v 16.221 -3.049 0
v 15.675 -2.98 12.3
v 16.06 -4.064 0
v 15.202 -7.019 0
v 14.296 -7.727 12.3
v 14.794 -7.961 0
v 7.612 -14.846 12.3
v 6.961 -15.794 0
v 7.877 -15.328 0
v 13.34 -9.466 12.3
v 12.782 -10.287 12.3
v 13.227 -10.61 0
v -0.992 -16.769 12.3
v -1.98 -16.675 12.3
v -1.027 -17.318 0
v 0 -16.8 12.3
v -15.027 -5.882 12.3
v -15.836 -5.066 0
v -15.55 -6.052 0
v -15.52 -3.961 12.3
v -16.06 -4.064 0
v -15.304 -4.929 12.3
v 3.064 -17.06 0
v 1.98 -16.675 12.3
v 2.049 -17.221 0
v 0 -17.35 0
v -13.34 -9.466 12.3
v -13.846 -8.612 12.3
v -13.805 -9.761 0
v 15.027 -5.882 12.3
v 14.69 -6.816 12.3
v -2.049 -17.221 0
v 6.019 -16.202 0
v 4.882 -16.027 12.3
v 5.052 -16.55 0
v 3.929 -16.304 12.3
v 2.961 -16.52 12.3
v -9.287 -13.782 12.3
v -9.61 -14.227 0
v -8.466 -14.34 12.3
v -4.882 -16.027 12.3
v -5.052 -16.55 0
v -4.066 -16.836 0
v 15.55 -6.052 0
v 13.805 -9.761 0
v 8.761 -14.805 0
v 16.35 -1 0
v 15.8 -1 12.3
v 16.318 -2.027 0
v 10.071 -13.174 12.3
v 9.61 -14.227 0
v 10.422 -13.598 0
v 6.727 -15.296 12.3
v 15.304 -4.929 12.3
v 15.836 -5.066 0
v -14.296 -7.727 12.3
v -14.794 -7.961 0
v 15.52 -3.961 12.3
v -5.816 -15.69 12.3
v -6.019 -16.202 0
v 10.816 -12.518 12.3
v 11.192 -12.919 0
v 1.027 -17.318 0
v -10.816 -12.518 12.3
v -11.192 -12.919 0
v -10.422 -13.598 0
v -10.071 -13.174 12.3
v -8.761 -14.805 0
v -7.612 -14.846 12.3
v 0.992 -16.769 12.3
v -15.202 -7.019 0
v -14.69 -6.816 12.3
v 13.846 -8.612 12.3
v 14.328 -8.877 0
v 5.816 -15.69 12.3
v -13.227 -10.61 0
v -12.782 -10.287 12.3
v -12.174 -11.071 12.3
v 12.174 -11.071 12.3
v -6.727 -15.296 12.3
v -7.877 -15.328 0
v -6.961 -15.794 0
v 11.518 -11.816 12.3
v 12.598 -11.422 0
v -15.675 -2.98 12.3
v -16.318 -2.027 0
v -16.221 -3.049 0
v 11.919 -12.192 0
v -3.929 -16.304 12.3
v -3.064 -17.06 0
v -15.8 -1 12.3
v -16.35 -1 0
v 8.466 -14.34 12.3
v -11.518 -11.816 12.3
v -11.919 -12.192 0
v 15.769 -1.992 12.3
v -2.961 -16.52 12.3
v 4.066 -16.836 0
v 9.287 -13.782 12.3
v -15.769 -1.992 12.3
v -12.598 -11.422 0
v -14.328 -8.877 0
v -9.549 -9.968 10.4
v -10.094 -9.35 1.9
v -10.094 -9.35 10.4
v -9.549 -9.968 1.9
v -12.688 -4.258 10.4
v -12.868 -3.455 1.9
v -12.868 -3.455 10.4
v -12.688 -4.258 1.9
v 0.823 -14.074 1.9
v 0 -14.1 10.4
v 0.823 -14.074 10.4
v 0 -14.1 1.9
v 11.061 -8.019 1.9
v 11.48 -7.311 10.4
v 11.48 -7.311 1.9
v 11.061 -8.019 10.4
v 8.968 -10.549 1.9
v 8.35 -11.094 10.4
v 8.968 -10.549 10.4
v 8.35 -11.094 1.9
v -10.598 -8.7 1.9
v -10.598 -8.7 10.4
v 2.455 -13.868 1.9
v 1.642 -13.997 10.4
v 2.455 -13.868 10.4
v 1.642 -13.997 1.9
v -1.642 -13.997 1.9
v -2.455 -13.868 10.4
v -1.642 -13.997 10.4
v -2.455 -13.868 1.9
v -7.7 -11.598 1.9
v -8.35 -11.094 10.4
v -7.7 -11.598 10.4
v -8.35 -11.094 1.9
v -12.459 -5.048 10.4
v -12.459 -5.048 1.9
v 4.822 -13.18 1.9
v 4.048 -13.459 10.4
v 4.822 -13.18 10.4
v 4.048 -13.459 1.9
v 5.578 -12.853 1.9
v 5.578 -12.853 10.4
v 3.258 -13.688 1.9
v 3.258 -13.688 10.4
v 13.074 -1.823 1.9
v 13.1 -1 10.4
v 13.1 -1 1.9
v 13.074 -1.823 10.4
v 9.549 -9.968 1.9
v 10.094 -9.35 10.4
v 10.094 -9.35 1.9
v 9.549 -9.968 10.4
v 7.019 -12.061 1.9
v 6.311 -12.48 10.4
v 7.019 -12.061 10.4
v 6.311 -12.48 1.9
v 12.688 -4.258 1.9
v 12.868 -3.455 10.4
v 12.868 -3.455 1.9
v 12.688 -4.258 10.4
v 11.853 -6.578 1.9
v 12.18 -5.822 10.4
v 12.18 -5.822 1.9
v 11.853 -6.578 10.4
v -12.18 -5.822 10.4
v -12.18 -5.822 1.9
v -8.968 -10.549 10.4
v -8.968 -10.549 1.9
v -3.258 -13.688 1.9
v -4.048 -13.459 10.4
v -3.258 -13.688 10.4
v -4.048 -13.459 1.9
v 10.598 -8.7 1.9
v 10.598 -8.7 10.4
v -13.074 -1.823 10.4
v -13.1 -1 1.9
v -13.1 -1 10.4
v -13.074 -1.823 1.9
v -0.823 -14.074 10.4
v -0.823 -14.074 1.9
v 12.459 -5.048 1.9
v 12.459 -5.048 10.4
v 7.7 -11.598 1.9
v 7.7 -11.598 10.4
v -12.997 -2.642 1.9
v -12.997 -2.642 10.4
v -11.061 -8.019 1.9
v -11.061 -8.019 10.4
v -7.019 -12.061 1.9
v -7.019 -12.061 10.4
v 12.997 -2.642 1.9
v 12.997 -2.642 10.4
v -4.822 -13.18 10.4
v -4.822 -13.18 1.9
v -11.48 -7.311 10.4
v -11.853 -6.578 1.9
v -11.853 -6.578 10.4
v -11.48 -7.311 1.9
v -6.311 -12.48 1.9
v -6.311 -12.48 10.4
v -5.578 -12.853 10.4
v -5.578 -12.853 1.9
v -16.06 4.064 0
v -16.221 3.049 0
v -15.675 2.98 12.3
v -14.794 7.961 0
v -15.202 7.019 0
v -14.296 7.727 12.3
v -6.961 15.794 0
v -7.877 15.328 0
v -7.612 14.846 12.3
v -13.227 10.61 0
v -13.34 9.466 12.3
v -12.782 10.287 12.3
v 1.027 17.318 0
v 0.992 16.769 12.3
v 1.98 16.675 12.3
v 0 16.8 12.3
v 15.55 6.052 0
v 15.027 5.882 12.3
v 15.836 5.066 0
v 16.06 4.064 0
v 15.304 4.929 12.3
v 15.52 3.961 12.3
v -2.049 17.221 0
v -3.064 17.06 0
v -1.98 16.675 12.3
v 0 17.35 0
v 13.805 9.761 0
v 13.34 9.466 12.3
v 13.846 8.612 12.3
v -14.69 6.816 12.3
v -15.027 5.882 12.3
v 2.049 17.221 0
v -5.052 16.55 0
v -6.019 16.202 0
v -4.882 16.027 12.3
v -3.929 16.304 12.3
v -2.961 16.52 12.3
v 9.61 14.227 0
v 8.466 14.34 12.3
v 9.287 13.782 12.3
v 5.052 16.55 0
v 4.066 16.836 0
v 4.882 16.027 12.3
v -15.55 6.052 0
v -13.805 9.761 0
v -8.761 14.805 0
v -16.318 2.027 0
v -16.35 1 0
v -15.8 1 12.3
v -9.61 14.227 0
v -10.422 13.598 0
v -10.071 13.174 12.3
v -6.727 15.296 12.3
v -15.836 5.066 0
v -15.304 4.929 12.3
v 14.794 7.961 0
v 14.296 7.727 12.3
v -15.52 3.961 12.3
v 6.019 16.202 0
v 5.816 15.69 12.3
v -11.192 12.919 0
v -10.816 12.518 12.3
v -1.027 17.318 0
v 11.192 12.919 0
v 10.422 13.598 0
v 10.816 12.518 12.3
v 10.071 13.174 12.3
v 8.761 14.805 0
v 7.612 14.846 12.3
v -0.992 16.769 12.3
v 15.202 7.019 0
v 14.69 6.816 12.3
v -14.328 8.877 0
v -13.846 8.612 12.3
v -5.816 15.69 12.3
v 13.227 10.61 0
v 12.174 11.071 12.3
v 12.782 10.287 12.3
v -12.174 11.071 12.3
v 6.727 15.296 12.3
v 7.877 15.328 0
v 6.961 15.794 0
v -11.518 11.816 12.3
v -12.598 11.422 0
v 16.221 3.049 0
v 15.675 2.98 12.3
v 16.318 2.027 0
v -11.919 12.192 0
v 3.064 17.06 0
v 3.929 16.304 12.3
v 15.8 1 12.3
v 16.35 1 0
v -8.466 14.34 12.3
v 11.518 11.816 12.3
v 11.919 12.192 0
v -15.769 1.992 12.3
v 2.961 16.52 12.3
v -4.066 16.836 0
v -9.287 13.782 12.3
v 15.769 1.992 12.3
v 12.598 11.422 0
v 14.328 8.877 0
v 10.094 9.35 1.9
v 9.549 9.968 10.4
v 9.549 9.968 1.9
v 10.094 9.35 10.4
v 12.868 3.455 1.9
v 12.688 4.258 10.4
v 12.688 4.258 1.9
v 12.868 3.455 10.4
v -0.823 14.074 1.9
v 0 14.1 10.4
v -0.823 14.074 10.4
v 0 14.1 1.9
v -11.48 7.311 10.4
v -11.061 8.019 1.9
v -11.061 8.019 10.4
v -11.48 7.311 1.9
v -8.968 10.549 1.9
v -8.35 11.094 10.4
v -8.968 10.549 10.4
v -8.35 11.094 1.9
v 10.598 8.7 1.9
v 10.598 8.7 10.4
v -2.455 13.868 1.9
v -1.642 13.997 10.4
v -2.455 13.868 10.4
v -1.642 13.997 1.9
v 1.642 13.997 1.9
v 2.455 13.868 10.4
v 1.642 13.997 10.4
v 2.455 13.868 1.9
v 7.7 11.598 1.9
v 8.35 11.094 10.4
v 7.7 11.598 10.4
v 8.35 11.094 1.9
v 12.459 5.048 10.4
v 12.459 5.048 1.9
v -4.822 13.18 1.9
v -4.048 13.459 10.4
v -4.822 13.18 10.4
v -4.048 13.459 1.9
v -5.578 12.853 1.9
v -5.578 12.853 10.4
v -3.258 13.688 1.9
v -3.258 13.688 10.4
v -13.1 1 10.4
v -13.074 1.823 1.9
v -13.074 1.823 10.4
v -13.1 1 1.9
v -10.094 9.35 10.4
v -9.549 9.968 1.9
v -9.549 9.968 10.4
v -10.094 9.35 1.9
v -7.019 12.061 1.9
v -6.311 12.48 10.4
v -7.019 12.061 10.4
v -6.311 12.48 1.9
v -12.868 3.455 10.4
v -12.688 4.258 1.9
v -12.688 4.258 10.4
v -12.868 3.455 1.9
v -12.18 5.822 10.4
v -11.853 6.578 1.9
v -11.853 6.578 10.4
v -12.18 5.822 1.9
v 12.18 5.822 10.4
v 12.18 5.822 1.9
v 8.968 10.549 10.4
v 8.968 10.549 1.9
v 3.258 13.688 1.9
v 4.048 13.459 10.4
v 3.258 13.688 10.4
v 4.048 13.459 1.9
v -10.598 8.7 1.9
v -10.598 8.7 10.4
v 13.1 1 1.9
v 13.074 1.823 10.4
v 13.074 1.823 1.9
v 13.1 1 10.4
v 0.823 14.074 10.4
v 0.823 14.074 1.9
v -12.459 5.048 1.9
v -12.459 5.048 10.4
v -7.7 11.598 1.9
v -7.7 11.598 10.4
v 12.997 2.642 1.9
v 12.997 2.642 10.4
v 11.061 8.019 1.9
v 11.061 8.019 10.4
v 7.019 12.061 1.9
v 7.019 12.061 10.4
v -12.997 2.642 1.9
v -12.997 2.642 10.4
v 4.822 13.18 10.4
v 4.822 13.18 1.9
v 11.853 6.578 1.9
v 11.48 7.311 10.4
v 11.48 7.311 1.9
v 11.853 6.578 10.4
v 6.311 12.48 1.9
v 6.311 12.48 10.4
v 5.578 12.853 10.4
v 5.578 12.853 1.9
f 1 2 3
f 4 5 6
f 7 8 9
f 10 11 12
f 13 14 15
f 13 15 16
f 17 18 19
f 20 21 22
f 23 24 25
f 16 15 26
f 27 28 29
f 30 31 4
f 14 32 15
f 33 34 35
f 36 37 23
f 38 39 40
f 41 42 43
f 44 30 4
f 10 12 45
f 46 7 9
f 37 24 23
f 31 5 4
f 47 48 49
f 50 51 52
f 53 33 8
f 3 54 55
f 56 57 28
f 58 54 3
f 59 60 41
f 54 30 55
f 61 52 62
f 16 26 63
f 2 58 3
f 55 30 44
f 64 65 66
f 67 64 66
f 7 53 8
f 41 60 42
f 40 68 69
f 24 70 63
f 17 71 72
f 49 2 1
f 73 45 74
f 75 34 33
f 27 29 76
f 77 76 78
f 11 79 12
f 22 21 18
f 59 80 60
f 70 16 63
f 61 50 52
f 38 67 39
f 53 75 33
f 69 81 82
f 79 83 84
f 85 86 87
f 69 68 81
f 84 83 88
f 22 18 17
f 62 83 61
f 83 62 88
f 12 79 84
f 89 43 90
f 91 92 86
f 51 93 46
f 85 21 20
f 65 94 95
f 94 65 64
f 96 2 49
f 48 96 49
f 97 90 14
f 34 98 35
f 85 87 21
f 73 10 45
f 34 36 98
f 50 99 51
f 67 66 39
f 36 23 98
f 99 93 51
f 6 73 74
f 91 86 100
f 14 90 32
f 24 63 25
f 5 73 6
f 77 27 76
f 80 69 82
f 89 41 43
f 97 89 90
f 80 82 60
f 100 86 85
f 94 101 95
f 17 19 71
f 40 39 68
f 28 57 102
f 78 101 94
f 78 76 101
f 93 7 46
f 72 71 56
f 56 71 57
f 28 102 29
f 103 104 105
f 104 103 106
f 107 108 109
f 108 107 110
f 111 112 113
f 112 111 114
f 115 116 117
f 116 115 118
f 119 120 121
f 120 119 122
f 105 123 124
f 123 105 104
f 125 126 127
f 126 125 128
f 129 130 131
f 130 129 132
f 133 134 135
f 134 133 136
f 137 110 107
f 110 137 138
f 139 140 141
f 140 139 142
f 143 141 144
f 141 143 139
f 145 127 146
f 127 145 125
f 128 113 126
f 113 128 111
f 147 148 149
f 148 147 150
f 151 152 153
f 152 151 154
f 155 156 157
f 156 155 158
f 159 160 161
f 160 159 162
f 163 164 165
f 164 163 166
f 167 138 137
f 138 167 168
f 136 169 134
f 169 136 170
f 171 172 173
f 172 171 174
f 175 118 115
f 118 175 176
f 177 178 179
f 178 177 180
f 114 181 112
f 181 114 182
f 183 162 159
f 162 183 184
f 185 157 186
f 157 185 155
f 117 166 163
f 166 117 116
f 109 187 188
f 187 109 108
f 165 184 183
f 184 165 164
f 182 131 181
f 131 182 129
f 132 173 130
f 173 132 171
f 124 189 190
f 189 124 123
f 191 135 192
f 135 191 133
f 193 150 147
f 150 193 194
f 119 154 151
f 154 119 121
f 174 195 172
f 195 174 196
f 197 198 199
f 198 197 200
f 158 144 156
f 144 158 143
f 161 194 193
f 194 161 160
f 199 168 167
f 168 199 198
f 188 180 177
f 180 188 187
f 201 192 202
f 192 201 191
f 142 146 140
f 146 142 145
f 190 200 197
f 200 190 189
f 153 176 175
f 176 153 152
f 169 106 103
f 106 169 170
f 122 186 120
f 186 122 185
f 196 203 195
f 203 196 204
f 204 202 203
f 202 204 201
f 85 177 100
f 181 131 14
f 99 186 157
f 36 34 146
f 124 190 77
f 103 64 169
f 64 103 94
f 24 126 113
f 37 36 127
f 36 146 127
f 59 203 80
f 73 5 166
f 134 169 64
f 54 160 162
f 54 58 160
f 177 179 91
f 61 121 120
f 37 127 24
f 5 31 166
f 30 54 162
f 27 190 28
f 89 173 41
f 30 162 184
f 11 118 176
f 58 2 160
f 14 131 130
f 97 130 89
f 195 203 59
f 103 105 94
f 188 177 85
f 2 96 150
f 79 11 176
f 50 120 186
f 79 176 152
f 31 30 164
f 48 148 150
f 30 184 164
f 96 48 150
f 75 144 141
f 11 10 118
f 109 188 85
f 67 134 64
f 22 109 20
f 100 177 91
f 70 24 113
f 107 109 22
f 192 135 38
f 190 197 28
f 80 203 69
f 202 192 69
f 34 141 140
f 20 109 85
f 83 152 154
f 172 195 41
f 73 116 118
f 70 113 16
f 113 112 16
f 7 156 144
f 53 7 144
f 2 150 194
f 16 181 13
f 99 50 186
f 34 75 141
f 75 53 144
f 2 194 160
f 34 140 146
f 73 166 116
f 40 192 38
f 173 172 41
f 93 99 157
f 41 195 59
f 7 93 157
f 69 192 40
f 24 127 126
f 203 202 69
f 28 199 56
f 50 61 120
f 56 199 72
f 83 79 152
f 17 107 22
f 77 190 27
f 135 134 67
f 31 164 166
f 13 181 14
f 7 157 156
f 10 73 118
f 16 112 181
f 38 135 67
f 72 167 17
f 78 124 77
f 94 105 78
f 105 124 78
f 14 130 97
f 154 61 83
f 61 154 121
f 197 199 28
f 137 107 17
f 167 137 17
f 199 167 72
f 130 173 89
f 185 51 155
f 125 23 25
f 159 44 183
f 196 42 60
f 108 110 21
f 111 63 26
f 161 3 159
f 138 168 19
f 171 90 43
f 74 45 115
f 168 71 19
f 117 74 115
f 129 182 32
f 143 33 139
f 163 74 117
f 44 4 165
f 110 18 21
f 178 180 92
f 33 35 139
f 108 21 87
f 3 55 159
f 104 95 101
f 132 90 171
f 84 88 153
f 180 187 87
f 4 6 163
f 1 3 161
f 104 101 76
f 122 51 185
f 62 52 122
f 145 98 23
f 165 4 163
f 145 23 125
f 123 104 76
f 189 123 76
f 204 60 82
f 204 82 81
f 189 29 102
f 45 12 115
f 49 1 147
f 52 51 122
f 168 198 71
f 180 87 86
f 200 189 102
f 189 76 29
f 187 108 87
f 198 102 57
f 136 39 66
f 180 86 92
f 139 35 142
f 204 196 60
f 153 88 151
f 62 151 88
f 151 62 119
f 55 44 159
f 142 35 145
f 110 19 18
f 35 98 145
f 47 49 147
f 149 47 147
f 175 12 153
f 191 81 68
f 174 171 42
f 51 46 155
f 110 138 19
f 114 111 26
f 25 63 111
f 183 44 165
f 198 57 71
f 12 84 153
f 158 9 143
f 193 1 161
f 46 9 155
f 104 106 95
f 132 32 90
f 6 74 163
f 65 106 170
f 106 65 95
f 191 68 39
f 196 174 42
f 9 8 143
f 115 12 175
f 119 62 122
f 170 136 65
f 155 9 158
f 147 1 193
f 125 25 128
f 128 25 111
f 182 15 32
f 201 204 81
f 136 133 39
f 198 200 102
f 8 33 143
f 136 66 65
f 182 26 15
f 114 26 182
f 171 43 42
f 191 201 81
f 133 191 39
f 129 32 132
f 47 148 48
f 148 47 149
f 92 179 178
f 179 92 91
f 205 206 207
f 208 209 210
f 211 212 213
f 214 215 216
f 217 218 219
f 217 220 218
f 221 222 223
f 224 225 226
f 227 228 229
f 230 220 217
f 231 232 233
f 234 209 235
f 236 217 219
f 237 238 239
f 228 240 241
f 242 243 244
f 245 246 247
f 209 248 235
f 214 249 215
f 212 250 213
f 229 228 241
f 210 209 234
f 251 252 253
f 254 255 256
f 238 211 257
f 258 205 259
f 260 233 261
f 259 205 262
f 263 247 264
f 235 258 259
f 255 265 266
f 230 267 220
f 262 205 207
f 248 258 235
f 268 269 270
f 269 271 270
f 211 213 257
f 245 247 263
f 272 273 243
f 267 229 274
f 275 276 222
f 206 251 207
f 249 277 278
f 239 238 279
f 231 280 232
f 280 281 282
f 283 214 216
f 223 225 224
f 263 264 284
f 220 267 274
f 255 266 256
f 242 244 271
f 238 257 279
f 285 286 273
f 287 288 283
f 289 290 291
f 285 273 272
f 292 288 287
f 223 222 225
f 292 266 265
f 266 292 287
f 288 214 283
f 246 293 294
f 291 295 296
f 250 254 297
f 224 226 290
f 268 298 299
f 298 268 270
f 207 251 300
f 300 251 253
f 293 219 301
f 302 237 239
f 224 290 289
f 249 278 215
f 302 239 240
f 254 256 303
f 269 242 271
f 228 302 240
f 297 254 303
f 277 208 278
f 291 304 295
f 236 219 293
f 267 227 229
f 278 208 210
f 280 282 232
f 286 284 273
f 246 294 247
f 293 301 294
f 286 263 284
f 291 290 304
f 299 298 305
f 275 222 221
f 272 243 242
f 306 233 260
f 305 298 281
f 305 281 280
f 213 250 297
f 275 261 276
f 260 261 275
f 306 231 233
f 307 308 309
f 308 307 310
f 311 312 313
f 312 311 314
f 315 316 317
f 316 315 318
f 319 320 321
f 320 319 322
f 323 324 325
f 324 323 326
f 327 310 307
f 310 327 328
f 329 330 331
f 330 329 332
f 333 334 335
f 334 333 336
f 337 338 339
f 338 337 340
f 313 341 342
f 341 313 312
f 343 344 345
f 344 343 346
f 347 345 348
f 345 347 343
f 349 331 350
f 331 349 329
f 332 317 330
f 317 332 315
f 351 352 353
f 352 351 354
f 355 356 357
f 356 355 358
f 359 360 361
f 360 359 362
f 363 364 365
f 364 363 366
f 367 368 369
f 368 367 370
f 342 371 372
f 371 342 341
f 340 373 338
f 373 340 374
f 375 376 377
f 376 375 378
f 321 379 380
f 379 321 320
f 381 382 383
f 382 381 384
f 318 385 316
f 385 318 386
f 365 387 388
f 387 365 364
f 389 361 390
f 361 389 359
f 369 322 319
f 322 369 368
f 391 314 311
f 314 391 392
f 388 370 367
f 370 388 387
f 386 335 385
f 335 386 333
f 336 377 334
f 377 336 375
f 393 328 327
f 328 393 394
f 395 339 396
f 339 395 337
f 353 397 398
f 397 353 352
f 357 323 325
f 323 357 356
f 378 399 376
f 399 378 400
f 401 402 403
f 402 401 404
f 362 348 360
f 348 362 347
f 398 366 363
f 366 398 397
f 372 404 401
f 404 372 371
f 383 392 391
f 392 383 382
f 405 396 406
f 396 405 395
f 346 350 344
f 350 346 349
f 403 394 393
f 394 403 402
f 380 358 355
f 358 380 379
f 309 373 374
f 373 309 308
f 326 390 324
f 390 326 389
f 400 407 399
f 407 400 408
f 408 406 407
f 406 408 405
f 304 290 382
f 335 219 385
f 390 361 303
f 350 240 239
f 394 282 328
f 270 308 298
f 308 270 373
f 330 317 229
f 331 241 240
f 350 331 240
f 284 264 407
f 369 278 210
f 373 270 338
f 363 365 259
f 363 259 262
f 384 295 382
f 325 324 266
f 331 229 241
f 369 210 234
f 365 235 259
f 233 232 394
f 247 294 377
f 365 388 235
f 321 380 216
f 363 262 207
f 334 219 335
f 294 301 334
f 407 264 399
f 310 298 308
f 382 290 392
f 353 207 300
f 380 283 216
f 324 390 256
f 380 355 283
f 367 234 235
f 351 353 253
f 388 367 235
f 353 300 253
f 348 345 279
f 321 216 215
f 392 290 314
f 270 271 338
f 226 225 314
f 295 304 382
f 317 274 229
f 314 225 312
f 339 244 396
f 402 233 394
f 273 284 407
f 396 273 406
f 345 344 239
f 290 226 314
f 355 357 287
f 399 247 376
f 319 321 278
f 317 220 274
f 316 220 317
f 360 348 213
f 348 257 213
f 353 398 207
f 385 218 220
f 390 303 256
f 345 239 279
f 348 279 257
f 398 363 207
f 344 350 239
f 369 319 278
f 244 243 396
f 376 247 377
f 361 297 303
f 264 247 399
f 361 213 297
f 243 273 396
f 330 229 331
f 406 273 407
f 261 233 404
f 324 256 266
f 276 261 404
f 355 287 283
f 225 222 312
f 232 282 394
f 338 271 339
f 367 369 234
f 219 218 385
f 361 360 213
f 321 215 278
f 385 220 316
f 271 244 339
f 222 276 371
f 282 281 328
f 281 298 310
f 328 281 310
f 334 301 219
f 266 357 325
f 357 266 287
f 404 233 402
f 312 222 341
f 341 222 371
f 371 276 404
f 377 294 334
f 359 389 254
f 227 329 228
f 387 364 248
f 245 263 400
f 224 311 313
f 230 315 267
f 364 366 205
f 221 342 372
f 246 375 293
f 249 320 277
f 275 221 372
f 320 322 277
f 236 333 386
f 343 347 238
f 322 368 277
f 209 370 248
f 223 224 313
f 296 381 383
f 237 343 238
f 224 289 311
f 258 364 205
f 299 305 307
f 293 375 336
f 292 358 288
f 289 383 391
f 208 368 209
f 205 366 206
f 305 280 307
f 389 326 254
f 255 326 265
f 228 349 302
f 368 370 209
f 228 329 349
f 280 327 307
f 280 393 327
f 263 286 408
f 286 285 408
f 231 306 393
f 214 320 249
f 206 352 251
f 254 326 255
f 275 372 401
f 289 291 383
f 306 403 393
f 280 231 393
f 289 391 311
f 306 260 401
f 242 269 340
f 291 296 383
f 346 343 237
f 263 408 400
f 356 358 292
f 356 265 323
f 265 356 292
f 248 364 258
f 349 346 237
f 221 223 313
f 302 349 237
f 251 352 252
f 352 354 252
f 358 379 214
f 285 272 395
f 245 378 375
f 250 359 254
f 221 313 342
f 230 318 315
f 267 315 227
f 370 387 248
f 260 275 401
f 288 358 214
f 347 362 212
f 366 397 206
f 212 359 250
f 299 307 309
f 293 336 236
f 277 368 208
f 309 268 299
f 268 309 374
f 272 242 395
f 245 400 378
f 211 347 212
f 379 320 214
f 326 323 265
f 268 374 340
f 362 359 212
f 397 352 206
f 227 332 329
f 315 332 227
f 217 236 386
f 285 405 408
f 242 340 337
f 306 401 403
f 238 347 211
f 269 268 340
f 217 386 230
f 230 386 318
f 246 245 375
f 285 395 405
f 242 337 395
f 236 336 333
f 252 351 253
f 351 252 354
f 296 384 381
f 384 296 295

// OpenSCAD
d_in_max = 26.2;
d_in_min = 26.2;
h_in = 8.5;

d_out_max = 32.7;
d_out_min = 31.6;
h_out = 12.3;

$fn=100;

module spool(){
difference(){
cylinder(r1=d_out_max/2, r2=d_out_min/2, h=h_out);
translate([0,0,(h_out-h_in)/2])cylinder(r1=d_in_max/2, r2=d_in_min/2, h=h_in);
translate([0,0,h_in+(h_out-h_in)/2])cylinder(r1=d_in_min/2, r2=d_out_min/2, h=(h_out-h_in)/2);
translate([0,0,0])cylinder(r1=d_out_max/2, r2=d_in_max/2, h=(h_out-h_in)/2);
translate([-d_out_max,0,-1])cube([d_out_max*2,d_out_max,h_out*2]);
}
}

translate([0,-1,0])spool();
translate([0,1,0])rotate([0,0,180])spool();
